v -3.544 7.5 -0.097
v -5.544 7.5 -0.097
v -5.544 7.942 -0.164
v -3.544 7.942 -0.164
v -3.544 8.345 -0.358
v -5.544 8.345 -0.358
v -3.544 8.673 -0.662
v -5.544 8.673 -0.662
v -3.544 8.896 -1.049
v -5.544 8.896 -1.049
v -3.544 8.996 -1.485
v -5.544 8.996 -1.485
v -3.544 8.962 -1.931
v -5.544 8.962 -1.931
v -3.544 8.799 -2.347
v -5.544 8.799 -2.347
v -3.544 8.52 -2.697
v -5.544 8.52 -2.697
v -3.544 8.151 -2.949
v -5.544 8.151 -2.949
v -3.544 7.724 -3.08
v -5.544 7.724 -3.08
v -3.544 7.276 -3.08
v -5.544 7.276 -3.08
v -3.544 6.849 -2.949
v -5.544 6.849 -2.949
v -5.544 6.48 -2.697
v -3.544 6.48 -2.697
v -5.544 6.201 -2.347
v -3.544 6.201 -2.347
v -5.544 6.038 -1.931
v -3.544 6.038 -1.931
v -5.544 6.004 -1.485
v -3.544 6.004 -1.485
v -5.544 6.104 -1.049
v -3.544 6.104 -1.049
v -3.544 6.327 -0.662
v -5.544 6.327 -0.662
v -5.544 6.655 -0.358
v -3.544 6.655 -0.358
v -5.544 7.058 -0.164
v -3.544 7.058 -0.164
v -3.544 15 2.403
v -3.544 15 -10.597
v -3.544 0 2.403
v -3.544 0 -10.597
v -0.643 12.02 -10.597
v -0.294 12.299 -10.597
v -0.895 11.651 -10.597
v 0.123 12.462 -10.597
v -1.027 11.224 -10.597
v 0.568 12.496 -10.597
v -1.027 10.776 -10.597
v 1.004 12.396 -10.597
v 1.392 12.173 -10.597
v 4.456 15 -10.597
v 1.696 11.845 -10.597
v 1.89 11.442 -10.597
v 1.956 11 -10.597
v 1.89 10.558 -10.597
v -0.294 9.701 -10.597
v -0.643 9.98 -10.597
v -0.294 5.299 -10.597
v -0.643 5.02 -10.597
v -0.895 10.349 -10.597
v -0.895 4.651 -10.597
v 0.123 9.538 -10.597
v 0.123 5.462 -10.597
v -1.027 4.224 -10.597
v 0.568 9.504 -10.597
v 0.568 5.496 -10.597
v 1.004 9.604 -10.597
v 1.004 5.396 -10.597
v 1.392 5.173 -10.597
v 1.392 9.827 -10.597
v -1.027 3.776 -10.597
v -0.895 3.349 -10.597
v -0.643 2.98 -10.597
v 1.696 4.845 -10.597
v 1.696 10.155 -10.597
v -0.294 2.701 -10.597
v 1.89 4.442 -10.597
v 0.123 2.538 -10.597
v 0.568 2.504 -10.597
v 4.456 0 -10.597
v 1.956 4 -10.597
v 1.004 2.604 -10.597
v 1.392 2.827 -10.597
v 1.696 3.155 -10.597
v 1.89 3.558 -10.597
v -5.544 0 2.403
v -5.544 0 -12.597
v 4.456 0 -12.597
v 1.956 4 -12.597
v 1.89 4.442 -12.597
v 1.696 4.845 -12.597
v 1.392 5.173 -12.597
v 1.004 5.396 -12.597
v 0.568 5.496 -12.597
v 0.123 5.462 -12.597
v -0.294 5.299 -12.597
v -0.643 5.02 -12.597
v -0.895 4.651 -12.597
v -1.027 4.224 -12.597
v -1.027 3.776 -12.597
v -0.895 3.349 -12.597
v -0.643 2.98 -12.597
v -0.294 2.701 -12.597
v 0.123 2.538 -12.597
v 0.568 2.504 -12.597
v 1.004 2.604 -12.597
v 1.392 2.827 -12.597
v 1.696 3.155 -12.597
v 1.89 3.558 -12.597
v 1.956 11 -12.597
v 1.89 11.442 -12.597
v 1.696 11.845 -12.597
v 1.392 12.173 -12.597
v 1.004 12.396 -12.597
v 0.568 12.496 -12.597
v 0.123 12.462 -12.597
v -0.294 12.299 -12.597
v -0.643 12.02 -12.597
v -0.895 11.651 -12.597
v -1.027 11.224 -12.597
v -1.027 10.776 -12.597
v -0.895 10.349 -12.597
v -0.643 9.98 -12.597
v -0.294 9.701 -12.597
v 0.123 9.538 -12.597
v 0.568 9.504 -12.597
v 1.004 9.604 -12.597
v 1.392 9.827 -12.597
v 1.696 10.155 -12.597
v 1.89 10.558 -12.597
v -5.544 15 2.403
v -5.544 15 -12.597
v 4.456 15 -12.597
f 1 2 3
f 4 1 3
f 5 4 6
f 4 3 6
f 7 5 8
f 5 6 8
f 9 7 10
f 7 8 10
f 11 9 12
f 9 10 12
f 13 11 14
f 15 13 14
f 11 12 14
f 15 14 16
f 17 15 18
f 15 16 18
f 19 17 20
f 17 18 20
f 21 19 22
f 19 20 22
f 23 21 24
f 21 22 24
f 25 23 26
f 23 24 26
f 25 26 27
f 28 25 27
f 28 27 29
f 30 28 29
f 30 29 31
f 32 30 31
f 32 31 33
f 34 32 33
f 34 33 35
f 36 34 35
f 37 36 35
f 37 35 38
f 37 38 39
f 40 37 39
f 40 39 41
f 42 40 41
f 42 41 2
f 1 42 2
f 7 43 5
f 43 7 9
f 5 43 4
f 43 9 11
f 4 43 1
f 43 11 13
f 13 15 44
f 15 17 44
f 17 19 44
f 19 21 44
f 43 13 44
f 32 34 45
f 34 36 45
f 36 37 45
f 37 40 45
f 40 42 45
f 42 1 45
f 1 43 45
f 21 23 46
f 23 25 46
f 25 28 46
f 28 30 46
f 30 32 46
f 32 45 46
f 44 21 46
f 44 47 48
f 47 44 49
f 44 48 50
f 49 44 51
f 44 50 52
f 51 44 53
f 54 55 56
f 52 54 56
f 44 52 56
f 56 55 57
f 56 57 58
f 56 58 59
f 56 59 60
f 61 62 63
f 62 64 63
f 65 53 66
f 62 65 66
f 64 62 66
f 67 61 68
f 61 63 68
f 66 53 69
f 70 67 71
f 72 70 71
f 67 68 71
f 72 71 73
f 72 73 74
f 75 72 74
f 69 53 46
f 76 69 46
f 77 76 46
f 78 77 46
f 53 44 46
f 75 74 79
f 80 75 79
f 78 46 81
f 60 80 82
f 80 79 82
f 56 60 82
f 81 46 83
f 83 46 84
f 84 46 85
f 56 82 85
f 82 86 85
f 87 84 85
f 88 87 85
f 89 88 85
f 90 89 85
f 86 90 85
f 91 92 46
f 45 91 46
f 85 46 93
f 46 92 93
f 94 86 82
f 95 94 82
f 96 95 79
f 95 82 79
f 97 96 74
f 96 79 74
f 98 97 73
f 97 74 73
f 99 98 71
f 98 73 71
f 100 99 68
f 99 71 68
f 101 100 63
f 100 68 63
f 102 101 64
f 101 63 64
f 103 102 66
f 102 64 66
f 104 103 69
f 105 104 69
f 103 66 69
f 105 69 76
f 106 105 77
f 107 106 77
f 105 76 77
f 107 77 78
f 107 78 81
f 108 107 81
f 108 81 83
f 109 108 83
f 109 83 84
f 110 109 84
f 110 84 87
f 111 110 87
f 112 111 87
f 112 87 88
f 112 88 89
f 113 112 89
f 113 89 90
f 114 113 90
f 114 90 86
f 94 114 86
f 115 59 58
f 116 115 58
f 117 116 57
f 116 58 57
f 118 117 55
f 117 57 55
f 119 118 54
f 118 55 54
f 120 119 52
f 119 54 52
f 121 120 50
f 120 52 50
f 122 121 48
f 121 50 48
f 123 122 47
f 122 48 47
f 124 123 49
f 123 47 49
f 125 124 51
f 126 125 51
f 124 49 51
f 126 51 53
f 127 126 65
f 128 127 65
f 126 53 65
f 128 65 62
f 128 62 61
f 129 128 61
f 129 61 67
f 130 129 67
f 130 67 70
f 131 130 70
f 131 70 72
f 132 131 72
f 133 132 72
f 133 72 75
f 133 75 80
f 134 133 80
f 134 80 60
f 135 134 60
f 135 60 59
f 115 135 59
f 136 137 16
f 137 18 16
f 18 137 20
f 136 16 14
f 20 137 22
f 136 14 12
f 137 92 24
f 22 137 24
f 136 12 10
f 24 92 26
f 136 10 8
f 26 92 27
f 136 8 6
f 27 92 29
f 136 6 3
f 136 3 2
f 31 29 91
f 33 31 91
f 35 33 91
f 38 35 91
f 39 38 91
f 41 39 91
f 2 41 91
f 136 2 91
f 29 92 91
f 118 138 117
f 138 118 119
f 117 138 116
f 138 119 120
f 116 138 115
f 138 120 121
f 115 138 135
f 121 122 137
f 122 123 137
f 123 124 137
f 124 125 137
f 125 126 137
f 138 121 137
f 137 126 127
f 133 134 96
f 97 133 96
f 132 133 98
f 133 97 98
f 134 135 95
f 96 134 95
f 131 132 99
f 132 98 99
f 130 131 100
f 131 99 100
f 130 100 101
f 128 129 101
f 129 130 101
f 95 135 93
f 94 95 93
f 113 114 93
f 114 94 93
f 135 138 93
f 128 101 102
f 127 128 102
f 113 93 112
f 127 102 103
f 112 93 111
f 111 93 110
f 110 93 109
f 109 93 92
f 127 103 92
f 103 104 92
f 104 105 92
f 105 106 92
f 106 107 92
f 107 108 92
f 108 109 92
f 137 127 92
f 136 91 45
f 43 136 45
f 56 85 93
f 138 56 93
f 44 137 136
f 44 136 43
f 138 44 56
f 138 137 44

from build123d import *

# Parameters (mm, degrees)
BOSS_EXTRUDE1_DEPTH             = 15
SKETCH3_R                       = 1.5
CUT_EXTRUDE1_DEPTH              = 3
SKETCH4_R                       = 1.5
SCHNITT_LINEAR_AUSTRAGEN1_DEPTH = 10


with BuildPart() as part:
    # Sketch1 → Boss-Extrude1 (new body)
    with BuildSketch(Plane(origin=(0, 0, 0), x_dir=(1, 0, 0), z_dir=(0, 1, 0))):
        Polygon((4.45631068, 12.597087379), (-5.54368932, 12.597087379), (-5.54368932, -2.402912621), (-3.54368932, -2.402912621), (-3.54368932, 10.597087379), (4.45631068, 10.597087379), align=None)
    extrude(amount=BOSS_EXTRUDE1_DEPTH)

    # Sketch3 → Cut-Extrude1 (cut, through all)
    with BuildSketch(Plane.XY.offset(-10.597087379)):
        with Locations((0.45631068, 11)):
            Circle(SKETCH3_R)
        with Locations((0.45631068, 4)):
            Circle(SKETCH3_R)
    extrude(amount=-CUT_EXTRUDE1_DEPTH, mode=Mode.SUBTRACT)

    # Sketch4 → Schnitt-Linear austragen1 (cut)
    with BuildSketch(Plane.ZY.offset(5.54368932)):
        with Locations((-1.597087379, 7.5)):
            Circle(SKETCH4_R)
    extrude(amount=-SCHNITT_LINEAR_AUSTRAGEN1_DEPTH, mode=Mode.SUBTRACT)


solid = part.part
